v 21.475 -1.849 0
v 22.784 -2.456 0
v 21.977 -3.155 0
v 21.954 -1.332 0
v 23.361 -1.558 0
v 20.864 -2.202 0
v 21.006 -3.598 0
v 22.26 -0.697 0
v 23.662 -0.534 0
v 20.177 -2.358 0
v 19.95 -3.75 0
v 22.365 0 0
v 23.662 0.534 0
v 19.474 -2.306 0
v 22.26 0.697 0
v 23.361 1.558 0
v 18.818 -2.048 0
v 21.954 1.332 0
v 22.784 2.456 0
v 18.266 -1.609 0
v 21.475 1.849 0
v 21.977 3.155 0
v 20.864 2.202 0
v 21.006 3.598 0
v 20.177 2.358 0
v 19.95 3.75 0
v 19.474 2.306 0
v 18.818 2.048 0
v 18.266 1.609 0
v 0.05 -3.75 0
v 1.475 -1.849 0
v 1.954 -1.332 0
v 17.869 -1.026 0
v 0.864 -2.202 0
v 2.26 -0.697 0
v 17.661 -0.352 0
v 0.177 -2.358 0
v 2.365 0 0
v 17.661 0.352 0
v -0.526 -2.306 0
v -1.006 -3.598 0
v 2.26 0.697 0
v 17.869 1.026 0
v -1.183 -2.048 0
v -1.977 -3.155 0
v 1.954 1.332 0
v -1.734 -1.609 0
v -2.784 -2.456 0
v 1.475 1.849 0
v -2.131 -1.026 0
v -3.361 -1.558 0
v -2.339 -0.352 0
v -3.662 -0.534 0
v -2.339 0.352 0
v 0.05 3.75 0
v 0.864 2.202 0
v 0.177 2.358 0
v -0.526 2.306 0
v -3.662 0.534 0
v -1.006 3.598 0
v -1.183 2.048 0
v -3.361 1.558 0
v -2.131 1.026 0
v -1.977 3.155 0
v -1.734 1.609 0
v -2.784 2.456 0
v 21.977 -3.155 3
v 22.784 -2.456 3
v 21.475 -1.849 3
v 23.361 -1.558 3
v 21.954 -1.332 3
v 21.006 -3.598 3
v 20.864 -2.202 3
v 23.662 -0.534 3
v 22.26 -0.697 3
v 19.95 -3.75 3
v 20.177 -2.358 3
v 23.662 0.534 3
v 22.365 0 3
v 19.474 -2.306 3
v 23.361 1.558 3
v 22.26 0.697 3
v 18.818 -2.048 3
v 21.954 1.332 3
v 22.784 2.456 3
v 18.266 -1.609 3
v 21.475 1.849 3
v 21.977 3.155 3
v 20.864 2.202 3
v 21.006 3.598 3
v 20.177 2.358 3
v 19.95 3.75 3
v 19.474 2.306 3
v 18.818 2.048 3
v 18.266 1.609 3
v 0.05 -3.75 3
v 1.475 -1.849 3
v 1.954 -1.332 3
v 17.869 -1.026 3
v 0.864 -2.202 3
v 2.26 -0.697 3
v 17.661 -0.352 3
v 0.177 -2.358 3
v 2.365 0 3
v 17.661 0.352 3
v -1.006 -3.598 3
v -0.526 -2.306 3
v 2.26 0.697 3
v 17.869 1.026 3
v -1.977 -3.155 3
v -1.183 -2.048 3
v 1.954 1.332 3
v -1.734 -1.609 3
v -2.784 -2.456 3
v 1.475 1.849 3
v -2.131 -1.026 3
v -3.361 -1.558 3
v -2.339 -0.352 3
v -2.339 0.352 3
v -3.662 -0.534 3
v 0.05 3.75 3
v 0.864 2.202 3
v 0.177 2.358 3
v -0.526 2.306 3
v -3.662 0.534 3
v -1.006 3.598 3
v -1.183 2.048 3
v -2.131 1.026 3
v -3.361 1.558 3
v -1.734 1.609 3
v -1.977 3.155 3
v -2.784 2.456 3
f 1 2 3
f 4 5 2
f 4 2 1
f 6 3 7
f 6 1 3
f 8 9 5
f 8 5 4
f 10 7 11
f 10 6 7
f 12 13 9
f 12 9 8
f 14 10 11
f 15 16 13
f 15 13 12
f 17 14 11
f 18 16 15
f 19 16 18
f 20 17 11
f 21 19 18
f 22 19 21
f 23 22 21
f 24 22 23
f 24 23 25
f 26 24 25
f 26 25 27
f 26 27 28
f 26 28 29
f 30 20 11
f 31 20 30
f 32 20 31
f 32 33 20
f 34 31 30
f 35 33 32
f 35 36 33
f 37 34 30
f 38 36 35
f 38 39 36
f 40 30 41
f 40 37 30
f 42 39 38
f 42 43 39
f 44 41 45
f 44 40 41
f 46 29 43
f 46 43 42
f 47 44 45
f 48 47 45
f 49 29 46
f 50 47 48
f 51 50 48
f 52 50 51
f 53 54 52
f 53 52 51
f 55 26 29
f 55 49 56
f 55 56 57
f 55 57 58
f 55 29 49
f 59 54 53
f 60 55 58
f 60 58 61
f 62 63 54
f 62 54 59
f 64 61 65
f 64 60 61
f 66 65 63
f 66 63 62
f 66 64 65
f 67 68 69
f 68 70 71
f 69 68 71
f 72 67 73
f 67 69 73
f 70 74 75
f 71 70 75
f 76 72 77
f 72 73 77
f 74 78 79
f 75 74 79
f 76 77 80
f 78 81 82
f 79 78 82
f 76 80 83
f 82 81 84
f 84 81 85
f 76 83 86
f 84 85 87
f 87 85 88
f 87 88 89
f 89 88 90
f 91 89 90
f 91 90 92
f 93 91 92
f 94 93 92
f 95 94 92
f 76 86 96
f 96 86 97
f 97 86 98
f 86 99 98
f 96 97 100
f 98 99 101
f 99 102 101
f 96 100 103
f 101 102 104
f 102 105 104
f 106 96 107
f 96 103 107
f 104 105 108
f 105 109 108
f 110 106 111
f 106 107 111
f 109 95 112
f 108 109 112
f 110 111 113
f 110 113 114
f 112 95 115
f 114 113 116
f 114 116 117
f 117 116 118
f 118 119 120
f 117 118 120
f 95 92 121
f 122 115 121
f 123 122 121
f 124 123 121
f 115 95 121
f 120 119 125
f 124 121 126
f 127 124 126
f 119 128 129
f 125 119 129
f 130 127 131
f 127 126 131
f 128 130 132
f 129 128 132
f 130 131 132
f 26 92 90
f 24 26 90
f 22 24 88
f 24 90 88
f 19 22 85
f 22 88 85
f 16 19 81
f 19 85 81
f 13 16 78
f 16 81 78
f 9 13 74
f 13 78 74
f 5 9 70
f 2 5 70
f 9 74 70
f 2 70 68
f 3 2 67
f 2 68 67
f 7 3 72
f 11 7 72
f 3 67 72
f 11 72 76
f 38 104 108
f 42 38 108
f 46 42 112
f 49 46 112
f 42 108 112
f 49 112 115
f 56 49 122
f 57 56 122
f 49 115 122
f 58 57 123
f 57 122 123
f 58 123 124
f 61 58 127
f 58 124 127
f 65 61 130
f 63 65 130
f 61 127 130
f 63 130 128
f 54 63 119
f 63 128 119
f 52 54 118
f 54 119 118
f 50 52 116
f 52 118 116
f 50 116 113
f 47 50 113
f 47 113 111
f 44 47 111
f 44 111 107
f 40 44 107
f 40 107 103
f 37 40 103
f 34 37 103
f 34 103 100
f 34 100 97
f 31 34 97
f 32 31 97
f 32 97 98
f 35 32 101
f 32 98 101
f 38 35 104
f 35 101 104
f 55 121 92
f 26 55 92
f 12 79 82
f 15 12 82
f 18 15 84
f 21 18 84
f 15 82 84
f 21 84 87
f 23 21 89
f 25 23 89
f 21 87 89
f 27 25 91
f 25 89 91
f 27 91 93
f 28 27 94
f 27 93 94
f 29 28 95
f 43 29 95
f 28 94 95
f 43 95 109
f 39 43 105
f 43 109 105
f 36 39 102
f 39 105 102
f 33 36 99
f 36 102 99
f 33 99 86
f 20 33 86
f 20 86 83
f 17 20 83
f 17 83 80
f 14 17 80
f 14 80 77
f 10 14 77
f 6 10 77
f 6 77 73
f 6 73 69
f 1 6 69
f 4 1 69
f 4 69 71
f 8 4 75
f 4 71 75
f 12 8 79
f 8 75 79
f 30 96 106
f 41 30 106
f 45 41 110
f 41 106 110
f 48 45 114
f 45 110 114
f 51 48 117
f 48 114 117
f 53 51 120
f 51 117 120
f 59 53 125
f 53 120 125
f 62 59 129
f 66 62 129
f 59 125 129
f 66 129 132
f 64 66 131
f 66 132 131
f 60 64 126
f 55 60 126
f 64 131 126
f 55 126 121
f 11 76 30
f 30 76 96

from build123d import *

# Parameters (mm, degrees)
SKETCH1_R           = 2.395
BOSS_EXTRUDE1_DEPTH = 3
SKETCH2_R           = 2.365
BOSS_EXTRUDE2_DEPTH = 3


with BuildPart() as part:
    # Sketch1 → Boss-Extrude1 (new body)
    with BuildSketch(Plane.XY):
        with BuildLine():
            Line((0, 3), (20, 3))
            ThreePointArc((20, 3), (23, 0), (20, -3))
            Line((20, -3), (0, -3))
            ThreePointArc((0, -3), (-3, 0), (0, 3))
        make_face()
        Circle(SKETCH1_R, mode=Mode.SUBTRACT)
        with Locations((20, 0)):
            Circle(SKETCH1_R, mode=Mode.SUBTRACT)
    extrude(amount=BOSS_EXTRUDE1_DEPTH)

    # Sketch2 → Boss-Extrude2 (add)
    with BuildSketch(Plane.XY.offset(3)):
        with BuildLine():
            Line((0.05, 3.75), (19.95, 3.75))
            ThreePointArc((19.95, 3.75), (23.7, 0), (19.95, -3.75))
            Line((19.95, -3.75), (0.05, -3.75))
            ThreePointArc((0.05, -3.75), (-3.7, 0), (0.05, 3.75))
        make_face()
        Circle(SKETCH2_R, mode=Mode.SUBTRACT)
        with Locations((20, 0)):
            Circle(SKETCH2_R, mode=Mode.SUBTRACT)
    extrude(amount=-BOSS_EXTRUDE2_DEPTH)


solid = part.part
